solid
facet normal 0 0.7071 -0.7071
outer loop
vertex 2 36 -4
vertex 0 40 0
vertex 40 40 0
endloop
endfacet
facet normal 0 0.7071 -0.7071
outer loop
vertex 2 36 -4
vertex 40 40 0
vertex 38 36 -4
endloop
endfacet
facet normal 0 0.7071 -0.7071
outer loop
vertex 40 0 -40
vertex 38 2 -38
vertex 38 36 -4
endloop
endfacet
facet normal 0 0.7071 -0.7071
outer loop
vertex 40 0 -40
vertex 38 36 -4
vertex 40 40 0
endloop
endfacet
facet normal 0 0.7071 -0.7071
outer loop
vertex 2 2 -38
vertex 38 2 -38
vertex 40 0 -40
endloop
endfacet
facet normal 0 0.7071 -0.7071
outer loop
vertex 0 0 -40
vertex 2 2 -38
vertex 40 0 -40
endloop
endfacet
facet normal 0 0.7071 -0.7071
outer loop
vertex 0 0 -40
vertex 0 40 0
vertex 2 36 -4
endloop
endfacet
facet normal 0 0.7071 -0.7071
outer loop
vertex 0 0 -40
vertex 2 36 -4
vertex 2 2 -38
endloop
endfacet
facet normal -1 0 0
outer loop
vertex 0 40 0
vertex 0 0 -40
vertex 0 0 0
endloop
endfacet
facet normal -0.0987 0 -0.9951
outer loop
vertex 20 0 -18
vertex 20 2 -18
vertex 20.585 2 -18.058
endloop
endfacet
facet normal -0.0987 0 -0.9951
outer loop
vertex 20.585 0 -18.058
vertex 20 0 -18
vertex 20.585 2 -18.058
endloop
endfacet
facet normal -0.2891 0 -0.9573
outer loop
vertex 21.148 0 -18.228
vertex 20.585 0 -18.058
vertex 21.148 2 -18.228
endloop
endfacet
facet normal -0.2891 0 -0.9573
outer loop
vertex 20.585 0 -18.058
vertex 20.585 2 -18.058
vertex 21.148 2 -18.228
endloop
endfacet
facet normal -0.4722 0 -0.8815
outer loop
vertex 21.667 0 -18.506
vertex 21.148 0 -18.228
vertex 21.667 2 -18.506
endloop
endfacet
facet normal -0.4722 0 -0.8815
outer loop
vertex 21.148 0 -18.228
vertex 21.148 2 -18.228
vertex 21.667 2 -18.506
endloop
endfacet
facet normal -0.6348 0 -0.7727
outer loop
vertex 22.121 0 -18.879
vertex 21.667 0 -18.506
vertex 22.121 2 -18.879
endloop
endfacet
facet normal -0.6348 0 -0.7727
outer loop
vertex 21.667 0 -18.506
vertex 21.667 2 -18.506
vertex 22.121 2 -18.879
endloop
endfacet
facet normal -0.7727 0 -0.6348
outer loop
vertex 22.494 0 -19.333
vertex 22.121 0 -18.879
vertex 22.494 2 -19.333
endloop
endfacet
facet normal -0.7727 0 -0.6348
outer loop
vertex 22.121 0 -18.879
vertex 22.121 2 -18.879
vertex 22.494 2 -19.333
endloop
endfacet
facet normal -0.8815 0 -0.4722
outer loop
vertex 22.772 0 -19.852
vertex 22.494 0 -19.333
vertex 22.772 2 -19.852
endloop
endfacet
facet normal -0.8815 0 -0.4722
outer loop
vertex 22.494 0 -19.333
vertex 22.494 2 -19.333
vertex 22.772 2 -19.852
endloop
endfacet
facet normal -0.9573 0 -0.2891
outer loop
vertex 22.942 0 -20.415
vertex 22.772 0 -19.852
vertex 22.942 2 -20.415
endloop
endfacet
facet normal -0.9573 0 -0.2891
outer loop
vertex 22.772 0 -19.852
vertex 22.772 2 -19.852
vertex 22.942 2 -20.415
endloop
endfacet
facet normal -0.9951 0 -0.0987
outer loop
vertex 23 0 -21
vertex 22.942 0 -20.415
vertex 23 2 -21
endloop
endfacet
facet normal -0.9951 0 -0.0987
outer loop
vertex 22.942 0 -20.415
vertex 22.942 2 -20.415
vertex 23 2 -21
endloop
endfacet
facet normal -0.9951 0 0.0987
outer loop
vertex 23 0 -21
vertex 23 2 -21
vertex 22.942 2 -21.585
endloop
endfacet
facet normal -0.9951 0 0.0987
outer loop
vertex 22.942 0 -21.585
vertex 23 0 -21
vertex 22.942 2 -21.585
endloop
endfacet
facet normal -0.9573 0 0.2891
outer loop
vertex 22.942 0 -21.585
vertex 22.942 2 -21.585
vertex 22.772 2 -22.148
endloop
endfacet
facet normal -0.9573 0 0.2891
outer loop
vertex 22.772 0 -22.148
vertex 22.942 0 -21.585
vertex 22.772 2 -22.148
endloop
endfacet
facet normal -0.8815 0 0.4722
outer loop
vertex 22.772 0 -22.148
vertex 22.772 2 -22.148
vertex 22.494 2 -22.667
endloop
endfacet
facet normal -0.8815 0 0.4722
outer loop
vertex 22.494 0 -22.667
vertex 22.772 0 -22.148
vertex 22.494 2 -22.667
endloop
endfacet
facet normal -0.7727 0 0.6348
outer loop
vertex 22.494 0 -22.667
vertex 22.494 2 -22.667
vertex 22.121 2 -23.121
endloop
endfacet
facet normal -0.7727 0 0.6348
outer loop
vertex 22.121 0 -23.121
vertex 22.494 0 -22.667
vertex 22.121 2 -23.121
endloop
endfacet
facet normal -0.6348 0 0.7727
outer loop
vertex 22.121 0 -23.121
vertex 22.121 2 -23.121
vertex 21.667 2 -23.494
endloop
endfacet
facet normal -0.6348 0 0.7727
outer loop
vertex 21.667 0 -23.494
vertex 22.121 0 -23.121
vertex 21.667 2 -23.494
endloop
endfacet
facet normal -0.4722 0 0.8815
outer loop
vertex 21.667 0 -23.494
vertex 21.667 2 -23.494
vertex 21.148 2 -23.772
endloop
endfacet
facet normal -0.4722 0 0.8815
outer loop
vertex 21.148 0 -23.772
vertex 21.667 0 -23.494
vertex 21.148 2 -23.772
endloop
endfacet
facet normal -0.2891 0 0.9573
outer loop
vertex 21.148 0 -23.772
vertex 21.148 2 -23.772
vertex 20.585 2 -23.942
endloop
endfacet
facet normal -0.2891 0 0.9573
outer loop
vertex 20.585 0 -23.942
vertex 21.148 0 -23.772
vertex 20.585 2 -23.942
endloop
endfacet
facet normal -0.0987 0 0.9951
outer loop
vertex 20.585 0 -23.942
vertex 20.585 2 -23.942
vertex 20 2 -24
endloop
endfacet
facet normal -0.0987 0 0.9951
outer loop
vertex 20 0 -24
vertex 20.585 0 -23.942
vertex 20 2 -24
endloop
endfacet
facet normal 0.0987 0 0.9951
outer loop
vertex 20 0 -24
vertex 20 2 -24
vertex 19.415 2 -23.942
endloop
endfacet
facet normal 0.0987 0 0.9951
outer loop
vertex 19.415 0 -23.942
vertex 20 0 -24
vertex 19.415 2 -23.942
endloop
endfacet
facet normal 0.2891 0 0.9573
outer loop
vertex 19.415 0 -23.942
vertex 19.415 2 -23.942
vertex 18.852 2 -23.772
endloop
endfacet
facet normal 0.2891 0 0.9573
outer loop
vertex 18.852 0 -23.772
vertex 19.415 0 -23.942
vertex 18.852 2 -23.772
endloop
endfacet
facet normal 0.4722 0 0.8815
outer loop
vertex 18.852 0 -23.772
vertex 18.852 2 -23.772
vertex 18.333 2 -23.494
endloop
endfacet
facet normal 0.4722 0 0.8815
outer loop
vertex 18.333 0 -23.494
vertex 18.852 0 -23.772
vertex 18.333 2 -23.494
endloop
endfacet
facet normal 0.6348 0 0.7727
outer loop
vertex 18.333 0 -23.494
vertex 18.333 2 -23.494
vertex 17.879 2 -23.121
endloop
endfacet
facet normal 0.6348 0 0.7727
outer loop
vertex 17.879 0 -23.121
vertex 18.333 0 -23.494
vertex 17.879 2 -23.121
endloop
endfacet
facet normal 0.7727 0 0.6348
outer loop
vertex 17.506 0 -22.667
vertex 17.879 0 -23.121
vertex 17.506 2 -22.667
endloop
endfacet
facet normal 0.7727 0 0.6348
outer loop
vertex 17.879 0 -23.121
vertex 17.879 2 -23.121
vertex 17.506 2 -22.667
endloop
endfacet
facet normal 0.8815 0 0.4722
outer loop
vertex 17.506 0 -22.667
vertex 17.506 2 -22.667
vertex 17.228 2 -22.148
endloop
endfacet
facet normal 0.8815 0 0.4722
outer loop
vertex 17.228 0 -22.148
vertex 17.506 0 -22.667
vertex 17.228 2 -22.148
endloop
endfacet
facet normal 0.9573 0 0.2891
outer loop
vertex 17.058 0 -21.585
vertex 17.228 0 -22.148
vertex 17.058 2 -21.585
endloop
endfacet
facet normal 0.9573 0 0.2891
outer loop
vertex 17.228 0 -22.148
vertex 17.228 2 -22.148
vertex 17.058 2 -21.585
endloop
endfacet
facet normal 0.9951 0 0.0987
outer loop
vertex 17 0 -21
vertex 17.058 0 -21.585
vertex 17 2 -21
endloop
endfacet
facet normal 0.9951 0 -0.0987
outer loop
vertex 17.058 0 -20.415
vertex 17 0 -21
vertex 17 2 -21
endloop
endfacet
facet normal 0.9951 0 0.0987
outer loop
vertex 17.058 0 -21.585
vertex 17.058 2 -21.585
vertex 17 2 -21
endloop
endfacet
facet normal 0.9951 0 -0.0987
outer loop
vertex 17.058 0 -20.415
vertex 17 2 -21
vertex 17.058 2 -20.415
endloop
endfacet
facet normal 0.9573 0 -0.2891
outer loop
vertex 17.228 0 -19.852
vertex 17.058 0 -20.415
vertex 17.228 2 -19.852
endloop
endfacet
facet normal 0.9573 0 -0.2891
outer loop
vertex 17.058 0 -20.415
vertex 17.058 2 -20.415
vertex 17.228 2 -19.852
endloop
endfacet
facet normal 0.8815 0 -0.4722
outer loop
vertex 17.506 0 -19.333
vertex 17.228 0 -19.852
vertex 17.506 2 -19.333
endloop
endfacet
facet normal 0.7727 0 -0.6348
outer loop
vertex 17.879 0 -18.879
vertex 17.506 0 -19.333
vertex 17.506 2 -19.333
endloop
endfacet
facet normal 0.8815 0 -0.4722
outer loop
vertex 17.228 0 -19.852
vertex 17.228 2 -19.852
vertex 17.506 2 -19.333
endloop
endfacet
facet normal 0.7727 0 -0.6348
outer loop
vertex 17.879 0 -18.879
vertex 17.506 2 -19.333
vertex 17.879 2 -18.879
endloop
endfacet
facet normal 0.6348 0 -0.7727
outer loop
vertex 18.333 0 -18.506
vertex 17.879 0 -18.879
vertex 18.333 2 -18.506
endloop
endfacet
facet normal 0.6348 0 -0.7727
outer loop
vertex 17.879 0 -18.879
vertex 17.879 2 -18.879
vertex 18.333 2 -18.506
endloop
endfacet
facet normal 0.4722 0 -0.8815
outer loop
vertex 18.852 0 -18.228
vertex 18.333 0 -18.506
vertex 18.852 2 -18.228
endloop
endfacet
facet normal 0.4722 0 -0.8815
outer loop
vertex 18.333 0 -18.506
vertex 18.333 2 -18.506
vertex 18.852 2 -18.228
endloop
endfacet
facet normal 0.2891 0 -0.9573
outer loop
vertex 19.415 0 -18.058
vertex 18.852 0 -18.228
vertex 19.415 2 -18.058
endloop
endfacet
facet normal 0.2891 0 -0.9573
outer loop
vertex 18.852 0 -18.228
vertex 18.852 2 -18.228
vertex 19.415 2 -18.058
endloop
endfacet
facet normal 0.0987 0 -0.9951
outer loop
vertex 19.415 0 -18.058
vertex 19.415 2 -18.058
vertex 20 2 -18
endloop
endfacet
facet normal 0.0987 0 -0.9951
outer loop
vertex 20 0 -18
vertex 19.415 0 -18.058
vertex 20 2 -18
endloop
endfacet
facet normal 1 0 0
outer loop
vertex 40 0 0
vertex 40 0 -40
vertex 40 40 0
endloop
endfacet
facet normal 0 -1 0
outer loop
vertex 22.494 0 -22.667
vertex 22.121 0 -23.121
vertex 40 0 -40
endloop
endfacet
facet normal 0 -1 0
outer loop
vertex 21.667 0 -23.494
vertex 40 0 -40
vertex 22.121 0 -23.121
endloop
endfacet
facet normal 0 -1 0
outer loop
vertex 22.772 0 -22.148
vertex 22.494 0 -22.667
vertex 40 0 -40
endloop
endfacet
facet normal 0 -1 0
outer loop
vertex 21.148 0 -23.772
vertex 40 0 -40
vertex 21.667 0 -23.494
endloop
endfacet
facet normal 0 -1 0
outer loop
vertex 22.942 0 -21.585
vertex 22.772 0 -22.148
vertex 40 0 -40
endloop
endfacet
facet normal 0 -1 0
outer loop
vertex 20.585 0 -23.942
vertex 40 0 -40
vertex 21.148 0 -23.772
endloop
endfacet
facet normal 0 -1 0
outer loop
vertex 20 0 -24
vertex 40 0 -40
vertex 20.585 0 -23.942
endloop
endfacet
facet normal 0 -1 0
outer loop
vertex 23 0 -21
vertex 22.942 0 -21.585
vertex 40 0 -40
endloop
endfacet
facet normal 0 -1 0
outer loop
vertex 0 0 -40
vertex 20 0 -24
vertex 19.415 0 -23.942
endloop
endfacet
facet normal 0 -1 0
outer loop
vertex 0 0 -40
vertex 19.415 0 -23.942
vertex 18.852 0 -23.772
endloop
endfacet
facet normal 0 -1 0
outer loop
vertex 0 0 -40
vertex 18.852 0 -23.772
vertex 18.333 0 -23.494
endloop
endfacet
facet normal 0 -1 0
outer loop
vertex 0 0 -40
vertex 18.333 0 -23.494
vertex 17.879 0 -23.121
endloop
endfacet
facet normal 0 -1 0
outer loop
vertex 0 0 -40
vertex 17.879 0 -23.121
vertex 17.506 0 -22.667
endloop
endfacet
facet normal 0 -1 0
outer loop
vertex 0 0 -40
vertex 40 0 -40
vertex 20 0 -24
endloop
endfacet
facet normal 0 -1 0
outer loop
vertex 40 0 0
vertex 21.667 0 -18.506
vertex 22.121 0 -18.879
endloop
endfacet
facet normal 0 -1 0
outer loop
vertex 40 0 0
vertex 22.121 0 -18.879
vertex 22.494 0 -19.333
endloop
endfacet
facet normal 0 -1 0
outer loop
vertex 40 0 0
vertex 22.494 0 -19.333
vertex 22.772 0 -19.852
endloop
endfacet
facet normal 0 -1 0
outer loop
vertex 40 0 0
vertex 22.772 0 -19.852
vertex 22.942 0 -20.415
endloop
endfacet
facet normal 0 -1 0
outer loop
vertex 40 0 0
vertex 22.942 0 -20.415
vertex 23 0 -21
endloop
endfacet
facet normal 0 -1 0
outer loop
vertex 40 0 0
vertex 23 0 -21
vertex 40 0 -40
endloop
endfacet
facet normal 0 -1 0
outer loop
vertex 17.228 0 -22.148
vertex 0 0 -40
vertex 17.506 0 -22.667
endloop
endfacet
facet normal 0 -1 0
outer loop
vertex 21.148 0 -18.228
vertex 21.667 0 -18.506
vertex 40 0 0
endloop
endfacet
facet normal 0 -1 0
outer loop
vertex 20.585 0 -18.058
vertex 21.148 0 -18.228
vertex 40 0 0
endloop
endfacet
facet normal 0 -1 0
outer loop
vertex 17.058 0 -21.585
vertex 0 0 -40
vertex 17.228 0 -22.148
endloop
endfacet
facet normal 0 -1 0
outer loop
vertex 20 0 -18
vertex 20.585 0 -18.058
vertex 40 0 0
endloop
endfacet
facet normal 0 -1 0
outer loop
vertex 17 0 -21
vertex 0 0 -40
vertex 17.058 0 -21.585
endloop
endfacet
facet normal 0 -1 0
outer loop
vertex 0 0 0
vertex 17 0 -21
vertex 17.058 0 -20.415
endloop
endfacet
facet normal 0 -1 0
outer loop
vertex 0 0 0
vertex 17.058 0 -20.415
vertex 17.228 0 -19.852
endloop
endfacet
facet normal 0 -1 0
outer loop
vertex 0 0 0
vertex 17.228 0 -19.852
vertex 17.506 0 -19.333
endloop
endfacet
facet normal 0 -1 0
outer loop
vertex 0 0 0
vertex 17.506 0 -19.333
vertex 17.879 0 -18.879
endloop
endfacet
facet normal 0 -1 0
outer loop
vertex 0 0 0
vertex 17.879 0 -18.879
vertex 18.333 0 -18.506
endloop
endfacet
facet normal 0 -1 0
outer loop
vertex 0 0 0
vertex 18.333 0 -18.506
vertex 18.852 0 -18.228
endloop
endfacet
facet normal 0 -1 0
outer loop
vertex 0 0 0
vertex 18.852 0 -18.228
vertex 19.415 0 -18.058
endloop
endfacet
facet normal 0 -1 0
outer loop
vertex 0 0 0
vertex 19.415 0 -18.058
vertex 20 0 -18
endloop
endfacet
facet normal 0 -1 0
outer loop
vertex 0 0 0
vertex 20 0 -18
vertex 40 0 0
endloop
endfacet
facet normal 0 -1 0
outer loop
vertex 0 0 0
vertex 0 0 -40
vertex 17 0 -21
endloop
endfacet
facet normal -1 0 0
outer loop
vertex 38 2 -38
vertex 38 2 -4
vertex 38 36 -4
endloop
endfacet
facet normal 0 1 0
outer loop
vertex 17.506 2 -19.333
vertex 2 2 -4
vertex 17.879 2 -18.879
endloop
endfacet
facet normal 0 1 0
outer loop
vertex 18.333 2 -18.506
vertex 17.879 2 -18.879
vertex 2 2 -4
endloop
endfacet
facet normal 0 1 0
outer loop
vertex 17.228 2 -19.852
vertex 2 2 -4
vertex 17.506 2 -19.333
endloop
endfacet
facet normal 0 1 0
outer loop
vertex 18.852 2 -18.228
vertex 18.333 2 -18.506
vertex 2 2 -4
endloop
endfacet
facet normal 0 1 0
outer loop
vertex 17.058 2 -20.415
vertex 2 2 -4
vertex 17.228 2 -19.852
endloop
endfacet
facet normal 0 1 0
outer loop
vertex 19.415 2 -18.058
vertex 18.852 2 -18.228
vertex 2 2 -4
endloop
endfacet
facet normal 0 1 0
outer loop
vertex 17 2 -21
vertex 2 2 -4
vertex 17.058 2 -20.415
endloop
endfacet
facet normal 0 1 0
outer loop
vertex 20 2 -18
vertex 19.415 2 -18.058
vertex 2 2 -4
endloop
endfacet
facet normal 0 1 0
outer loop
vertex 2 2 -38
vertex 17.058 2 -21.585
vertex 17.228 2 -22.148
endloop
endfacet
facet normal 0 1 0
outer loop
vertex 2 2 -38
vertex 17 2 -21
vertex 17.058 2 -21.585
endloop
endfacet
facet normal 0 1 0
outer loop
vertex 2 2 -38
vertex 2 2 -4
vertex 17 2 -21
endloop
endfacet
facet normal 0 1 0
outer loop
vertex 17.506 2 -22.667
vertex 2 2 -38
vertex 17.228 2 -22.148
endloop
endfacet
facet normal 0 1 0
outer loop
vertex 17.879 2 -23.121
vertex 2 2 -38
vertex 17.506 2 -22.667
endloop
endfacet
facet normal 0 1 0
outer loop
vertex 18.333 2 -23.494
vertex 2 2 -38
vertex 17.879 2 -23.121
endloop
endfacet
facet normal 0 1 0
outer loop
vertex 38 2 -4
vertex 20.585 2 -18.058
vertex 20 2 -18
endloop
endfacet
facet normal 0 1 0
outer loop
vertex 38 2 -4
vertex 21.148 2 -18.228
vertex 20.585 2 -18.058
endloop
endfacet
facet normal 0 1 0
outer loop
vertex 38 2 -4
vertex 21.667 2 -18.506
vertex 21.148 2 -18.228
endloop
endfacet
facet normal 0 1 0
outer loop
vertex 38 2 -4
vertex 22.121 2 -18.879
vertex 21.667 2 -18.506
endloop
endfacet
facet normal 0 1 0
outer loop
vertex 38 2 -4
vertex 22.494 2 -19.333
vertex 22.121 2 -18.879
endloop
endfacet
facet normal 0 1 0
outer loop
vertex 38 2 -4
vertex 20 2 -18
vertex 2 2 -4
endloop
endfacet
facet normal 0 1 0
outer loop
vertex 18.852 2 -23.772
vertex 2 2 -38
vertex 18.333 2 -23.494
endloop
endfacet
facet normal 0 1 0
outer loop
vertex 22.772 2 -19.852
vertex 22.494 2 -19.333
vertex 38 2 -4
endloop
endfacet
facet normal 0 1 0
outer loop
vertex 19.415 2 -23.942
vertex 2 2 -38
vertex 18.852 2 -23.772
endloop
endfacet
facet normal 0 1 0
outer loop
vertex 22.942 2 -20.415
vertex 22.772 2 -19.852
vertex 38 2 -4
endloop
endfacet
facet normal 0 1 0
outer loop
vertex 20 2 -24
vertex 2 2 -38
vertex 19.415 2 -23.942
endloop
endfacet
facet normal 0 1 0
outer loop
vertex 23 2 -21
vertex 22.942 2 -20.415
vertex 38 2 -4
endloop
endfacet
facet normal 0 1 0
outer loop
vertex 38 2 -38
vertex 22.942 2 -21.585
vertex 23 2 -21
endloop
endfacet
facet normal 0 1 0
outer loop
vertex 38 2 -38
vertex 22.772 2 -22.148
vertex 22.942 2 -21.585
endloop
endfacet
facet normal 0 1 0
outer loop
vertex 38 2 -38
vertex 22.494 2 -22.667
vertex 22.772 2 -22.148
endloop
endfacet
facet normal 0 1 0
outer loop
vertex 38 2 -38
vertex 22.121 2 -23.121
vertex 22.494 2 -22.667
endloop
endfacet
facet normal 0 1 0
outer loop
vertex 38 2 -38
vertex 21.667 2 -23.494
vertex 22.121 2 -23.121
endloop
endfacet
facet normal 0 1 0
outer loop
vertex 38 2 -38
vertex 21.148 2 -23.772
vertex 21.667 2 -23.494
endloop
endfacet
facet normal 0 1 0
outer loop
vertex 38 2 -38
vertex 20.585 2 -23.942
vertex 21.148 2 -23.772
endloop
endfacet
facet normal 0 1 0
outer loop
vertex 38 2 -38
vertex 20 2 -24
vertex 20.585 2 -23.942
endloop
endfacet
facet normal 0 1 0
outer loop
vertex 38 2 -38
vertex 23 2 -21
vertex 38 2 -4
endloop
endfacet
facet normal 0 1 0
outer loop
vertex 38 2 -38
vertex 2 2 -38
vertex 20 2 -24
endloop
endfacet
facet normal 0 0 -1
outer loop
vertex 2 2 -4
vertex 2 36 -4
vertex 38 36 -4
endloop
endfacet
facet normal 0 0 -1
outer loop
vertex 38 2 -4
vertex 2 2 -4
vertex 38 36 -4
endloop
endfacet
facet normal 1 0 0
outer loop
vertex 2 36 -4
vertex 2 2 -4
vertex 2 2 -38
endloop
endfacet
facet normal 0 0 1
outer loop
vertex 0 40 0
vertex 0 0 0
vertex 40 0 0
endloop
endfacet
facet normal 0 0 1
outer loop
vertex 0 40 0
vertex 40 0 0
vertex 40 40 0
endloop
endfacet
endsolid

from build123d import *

# Parameters (mm, degrees)
BOSS_EXTRUDE1_DEPTH = 40
SKETCH3_W           = 36
SKETCH3_H           = 38
CUT_EXTRUDE1_DEPTH  = 36
CUT_EXTRUDE2_REACH  = 70.147
SKETCH4_R           = 3


with BuildPart() as part:
    # Sketch1 → Boss-Extrude1 (new body)
    with BuildSketch(Plane(origin=(0, 0, 0), x_dir=(0, 0, -1), z_dir=(1, 0, 0))):
        Polygon((0, 0), (0, 40), (40, 0), align=None)
    extrude(amount=BOSS_EXTRUDE1_DEPTH)

    # Sketch3 → Cut-Extrude1 (cut)
    with BuildSketch(Plane.XY.offset(-40)):
        with Locations((20, 21)):
            Rectangle(SKETCH3_W, SKETCH3_H)
    extrude(amount=CUT_EXTRUDE1_DEPTH, mode=Mode.SUBTRACT)

    # Sketch4 → Cut-Extrude2 (cut, up to next)
    with BuildSketch(Plane(origin=(0, 2, 0), x_dir=(1, 0, 0), z_dir=(0, 1, 0)), mode=Mode.PRIVATE) as cut_extrude2_sk1:
        with Locations(Location((20, 21, 0), (0, 0, 270))):
            Circle(SKETCH4_R)
    cut_extrude2_tool1 = extrude(cut_extrude2_sk1.sketch, amount=-CUT_EXTRUDE2_REACH, mode=Mode.PRIVATE) & part.part
    add(cut_extrude2_tool1.solids().sort_by_distance((20, 2, -21))[0], mode=Mode.SUBTRACT)


solid = part.part
